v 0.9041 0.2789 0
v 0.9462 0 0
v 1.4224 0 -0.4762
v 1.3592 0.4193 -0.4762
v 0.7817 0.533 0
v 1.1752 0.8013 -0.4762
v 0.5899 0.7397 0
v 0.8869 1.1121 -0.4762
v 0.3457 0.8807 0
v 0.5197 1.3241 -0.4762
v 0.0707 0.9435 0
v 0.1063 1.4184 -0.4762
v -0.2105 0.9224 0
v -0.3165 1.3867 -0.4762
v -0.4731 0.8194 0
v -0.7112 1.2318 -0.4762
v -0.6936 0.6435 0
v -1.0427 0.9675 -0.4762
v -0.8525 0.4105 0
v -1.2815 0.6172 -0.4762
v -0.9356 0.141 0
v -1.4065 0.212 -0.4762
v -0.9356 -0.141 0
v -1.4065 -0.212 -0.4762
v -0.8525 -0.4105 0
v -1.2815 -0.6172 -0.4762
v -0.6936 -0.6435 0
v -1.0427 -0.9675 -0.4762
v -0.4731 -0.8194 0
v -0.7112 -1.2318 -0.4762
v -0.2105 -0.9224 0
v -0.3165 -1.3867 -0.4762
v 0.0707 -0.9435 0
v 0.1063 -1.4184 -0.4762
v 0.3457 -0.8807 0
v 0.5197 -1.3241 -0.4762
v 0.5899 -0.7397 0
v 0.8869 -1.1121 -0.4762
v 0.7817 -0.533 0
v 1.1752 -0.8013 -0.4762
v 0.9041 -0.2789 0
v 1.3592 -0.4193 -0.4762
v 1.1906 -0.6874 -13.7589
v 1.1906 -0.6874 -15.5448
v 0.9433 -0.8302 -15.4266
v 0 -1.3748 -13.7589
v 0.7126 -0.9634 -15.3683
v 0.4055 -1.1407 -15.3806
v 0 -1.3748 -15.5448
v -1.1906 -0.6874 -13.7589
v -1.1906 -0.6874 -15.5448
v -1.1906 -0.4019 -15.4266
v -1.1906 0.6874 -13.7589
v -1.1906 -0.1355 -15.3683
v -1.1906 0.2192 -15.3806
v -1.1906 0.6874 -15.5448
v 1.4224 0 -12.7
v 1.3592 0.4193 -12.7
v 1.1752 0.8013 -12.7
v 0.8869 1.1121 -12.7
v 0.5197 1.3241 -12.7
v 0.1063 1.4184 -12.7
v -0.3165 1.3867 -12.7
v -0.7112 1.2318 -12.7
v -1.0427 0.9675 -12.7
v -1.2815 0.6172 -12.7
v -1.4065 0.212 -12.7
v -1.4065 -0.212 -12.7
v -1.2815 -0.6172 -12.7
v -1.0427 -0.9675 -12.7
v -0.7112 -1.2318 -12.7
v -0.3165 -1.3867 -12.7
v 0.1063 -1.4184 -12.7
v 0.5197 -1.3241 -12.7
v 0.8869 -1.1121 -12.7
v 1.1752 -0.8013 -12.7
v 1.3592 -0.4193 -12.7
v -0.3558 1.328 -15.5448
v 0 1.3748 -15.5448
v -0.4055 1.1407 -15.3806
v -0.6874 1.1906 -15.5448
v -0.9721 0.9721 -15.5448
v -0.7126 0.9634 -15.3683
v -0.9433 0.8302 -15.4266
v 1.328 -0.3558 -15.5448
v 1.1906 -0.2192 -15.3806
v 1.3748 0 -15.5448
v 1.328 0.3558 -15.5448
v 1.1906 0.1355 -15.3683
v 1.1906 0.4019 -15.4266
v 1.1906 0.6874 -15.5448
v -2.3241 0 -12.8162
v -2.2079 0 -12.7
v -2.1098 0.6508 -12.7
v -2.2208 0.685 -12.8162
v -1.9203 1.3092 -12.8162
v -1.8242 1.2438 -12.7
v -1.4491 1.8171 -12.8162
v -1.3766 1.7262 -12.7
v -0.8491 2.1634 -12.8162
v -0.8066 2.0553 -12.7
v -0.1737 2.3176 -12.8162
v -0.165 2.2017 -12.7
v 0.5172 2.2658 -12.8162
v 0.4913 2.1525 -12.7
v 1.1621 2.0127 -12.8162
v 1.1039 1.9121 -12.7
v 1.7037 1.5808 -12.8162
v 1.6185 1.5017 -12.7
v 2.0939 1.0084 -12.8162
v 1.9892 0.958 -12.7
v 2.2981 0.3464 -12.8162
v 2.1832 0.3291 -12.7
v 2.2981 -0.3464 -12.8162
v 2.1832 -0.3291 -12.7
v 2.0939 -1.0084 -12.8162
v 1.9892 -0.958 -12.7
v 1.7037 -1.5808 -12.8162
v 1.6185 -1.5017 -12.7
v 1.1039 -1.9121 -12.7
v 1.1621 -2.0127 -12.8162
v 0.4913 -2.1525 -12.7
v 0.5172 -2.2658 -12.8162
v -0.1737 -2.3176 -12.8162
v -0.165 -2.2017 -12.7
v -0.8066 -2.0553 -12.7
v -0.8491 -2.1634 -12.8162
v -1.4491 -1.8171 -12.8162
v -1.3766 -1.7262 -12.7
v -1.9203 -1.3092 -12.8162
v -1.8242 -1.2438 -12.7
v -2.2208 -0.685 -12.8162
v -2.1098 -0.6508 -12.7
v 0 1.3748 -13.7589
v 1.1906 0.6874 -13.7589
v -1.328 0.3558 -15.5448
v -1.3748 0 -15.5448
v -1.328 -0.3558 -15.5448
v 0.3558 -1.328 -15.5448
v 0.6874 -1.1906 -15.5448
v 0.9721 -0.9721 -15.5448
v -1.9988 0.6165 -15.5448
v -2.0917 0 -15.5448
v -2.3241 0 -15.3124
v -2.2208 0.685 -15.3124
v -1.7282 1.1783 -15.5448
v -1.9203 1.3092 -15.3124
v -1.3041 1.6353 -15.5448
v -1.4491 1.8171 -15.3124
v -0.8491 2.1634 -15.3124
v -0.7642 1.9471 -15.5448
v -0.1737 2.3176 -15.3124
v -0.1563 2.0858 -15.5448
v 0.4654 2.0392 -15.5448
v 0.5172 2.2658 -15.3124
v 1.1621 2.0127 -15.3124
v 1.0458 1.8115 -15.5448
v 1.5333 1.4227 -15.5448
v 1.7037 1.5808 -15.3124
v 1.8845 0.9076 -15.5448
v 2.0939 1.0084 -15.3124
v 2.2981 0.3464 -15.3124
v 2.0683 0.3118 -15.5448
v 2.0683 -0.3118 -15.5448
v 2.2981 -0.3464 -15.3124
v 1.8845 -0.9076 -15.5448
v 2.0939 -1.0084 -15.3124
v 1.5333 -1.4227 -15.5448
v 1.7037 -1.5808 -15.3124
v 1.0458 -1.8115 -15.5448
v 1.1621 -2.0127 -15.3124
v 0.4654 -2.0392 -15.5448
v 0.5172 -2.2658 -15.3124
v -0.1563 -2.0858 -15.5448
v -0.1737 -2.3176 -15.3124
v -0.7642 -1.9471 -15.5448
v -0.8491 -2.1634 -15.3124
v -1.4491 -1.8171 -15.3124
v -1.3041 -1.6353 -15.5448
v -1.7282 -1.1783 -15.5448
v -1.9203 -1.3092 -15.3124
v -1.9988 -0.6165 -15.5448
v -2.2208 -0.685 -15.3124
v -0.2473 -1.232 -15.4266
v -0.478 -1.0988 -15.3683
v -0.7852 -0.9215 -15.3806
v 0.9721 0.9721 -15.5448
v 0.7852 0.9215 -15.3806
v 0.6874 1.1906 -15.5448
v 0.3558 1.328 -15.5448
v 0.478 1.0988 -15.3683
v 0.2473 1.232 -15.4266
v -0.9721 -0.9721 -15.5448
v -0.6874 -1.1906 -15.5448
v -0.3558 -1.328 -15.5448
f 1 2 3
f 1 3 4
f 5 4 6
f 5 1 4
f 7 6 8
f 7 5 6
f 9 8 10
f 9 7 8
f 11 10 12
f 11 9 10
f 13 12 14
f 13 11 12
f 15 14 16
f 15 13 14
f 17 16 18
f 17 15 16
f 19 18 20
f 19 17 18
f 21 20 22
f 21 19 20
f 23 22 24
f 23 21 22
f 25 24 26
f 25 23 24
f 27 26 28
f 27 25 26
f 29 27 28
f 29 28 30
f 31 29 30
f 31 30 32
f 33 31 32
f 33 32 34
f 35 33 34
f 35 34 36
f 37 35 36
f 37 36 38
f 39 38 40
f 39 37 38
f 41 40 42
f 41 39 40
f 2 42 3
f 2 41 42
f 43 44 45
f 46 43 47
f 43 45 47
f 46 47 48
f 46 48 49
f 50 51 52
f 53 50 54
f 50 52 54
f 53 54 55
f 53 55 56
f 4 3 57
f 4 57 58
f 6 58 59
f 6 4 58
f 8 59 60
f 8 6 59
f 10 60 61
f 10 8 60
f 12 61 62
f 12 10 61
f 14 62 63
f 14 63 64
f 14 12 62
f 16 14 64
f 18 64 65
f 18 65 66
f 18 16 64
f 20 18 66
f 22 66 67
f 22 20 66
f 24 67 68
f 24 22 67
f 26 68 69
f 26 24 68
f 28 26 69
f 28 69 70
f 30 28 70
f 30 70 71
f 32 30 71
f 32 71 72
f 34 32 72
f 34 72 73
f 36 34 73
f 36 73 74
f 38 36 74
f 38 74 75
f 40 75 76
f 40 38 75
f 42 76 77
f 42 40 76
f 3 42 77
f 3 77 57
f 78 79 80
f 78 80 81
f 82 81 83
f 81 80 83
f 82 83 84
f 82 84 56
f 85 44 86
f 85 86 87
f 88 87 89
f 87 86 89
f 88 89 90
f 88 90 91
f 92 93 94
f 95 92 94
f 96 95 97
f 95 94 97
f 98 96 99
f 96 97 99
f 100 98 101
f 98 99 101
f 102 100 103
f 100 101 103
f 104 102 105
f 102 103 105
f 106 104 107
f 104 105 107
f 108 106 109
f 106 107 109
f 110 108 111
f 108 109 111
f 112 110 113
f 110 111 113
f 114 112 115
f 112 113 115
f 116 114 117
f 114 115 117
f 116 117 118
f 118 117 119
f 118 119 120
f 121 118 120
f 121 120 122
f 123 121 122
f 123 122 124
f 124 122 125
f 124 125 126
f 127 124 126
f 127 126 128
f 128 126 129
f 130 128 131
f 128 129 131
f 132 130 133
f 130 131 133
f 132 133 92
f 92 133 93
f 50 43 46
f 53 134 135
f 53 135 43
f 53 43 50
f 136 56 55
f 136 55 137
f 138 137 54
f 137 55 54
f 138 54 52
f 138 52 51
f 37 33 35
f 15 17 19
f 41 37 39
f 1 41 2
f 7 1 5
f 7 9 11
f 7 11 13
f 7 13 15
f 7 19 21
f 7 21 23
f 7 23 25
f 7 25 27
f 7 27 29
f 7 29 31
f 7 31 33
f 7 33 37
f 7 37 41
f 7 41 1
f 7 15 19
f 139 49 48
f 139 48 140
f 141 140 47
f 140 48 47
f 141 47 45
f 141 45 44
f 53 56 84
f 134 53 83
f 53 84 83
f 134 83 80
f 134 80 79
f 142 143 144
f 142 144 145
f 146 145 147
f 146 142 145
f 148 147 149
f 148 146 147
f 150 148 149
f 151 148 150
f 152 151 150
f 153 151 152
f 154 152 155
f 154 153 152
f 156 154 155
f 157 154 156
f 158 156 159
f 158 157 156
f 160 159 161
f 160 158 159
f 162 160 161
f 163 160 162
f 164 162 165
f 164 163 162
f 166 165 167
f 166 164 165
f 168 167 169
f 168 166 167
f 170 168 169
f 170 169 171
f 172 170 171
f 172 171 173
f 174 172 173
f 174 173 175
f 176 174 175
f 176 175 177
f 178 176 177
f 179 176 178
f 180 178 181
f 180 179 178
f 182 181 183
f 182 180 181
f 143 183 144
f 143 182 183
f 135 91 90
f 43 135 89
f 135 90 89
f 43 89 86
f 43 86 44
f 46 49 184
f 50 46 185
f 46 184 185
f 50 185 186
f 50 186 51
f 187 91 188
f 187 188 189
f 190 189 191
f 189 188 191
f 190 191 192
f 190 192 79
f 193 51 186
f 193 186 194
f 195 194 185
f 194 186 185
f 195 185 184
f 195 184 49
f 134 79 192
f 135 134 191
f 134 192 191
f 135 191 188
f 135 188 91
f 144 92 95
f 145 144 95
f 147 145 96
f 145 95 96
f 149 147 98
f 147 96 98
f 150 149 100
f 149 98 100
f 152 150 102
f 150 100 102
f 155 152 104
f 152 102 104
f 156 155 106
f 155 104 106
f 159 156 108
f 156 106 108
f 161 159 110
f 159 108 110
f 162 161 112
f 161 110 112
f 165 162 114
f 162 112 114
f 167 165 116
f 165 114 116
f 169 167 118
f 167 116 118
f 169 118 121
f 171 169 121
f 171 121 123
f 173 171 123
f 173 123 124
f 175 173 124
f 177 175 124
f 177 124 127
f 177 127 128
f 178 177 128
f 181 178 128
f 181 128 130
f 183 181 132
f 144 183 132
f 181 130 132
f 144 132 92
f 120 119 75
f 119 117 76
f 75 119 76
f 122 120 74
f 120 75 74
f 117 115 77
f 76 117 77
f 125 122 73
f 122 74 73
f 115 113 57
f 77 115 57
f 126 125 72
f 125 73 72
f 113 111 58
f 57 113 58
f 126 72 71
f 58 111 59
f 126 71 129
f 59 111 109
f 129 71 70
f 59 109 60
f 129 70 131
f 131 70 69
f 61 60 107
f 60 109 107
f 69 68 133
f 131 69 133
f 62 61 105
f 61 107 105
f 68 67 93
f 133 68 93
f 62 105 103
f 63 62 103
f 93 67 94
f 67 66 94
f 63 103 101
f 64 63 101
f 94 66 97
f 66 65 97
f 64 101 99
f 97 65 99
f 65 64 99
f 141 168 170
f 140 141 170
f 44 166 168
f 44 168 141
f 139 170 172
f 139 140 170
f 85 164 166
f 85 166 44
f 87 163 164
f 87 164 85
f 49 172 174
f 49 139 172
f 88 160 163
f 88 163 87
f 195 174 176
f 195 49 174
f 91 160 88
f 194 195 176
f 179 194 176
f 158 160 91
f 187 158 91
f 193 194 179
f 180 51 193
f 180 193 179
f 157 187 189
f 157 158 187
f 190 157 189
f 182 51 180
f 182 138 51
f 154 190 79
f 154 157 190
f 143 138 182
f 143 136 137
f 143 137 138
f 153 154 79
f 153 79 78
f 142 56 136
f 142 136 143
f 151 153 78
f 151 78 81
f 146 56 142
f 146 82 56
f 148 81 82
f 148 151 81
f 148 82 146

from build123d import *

# Parameters (mm, degrees)
SKETCH1_R          = 1.4224
EXTRUDE1_DEPTH     = 12.7
CHAMFER3_SIZE      = 0.47625
SKETCH6_R          = 2.3241
EXTRUDE2_DEPTH     = 2.8448
CUT_EXTRUDE1_DEPTH = 1.7859375
CHAMFER1_SIZE      = 0.23241
CHAMFER2_SIZE      = 0.116205


with BuildPart() as part:
    # Sketch1 → Extrude1 (new body)
    with BuildSketch(Plane.XY):
        Circle(SKETCH1_R)
    extrude(amount=-EXTRUDE1_DEPTH)

    # Chamfer3
    chamfer3_edges = [part.edges().sort_by_distance(p)[0] for p in [
        (-1.4224, 0, 0),
    ]]
    chamfer(chamfer3_edges, length=CHAMFER3_SIZE)

    # Sketch6 → Extrude2 (add)
    with BuildSketch(Plane(origin=(0, 0, -12.7), x_dir=(-1, 0, 0), z_dir=(0, 0, -1))):
        Circle(SKETCH6_R)
    extrude(amount=EXTRUDE2_DEPTH)

    # Sketch7 → Cut-Extrude1 (cut)
    with BuildSketch(Plane(origin=(0, 0, -15.5448), x_dir=(-1, 0, 0), z_dir=(0, 0, -1))):
        Polygon((0, 1.374815329), (-1.190625, 0.687407664), (-1.190625, -0.687407664), (0, -1.374815329), (1.190625, -0.687407664), (1.190625, 0.687407664), align=None)
    extrude(amount=-CUT_EXTRUDE1_DEPTH, mode=Mode.SUBTRACT)

    # Cut-Extrude2 cone 1 section (through the dimple's axis) → Cut-Extrude2 (revolve, cut)
    with BuildSketch(Plane(origin=(0, 0, -15.5448), x_dir=(0, 1, 0), z_dir=(1, 0, 0))):
        Polygon((0, 0), (1.374815329, 0), (0, 1.374815329), align=None)
    revolve(axis=Axis((0, 0, -15.5448), (0, 0, 1)), mode=Mode.SUBTRACT)

    # Chamfer1
    chamfer1_edges = [part.edges().sort_by_distance(p)[0] for p in [
        (2.3241, 0, -15.5448),
    ]]
    chamfer(chamfer1_edges, length=CHAMFER1_SIZE)

    # Chamfer2
    chamfer2_edges = [part.edges().sort_by_distance(p)[0] for p in [
        (2.3241, 0, -12.7),
    ]]
    chamfer(chamfer2_edges, length=CHAMFER2_SIZE)


solid = part.part
